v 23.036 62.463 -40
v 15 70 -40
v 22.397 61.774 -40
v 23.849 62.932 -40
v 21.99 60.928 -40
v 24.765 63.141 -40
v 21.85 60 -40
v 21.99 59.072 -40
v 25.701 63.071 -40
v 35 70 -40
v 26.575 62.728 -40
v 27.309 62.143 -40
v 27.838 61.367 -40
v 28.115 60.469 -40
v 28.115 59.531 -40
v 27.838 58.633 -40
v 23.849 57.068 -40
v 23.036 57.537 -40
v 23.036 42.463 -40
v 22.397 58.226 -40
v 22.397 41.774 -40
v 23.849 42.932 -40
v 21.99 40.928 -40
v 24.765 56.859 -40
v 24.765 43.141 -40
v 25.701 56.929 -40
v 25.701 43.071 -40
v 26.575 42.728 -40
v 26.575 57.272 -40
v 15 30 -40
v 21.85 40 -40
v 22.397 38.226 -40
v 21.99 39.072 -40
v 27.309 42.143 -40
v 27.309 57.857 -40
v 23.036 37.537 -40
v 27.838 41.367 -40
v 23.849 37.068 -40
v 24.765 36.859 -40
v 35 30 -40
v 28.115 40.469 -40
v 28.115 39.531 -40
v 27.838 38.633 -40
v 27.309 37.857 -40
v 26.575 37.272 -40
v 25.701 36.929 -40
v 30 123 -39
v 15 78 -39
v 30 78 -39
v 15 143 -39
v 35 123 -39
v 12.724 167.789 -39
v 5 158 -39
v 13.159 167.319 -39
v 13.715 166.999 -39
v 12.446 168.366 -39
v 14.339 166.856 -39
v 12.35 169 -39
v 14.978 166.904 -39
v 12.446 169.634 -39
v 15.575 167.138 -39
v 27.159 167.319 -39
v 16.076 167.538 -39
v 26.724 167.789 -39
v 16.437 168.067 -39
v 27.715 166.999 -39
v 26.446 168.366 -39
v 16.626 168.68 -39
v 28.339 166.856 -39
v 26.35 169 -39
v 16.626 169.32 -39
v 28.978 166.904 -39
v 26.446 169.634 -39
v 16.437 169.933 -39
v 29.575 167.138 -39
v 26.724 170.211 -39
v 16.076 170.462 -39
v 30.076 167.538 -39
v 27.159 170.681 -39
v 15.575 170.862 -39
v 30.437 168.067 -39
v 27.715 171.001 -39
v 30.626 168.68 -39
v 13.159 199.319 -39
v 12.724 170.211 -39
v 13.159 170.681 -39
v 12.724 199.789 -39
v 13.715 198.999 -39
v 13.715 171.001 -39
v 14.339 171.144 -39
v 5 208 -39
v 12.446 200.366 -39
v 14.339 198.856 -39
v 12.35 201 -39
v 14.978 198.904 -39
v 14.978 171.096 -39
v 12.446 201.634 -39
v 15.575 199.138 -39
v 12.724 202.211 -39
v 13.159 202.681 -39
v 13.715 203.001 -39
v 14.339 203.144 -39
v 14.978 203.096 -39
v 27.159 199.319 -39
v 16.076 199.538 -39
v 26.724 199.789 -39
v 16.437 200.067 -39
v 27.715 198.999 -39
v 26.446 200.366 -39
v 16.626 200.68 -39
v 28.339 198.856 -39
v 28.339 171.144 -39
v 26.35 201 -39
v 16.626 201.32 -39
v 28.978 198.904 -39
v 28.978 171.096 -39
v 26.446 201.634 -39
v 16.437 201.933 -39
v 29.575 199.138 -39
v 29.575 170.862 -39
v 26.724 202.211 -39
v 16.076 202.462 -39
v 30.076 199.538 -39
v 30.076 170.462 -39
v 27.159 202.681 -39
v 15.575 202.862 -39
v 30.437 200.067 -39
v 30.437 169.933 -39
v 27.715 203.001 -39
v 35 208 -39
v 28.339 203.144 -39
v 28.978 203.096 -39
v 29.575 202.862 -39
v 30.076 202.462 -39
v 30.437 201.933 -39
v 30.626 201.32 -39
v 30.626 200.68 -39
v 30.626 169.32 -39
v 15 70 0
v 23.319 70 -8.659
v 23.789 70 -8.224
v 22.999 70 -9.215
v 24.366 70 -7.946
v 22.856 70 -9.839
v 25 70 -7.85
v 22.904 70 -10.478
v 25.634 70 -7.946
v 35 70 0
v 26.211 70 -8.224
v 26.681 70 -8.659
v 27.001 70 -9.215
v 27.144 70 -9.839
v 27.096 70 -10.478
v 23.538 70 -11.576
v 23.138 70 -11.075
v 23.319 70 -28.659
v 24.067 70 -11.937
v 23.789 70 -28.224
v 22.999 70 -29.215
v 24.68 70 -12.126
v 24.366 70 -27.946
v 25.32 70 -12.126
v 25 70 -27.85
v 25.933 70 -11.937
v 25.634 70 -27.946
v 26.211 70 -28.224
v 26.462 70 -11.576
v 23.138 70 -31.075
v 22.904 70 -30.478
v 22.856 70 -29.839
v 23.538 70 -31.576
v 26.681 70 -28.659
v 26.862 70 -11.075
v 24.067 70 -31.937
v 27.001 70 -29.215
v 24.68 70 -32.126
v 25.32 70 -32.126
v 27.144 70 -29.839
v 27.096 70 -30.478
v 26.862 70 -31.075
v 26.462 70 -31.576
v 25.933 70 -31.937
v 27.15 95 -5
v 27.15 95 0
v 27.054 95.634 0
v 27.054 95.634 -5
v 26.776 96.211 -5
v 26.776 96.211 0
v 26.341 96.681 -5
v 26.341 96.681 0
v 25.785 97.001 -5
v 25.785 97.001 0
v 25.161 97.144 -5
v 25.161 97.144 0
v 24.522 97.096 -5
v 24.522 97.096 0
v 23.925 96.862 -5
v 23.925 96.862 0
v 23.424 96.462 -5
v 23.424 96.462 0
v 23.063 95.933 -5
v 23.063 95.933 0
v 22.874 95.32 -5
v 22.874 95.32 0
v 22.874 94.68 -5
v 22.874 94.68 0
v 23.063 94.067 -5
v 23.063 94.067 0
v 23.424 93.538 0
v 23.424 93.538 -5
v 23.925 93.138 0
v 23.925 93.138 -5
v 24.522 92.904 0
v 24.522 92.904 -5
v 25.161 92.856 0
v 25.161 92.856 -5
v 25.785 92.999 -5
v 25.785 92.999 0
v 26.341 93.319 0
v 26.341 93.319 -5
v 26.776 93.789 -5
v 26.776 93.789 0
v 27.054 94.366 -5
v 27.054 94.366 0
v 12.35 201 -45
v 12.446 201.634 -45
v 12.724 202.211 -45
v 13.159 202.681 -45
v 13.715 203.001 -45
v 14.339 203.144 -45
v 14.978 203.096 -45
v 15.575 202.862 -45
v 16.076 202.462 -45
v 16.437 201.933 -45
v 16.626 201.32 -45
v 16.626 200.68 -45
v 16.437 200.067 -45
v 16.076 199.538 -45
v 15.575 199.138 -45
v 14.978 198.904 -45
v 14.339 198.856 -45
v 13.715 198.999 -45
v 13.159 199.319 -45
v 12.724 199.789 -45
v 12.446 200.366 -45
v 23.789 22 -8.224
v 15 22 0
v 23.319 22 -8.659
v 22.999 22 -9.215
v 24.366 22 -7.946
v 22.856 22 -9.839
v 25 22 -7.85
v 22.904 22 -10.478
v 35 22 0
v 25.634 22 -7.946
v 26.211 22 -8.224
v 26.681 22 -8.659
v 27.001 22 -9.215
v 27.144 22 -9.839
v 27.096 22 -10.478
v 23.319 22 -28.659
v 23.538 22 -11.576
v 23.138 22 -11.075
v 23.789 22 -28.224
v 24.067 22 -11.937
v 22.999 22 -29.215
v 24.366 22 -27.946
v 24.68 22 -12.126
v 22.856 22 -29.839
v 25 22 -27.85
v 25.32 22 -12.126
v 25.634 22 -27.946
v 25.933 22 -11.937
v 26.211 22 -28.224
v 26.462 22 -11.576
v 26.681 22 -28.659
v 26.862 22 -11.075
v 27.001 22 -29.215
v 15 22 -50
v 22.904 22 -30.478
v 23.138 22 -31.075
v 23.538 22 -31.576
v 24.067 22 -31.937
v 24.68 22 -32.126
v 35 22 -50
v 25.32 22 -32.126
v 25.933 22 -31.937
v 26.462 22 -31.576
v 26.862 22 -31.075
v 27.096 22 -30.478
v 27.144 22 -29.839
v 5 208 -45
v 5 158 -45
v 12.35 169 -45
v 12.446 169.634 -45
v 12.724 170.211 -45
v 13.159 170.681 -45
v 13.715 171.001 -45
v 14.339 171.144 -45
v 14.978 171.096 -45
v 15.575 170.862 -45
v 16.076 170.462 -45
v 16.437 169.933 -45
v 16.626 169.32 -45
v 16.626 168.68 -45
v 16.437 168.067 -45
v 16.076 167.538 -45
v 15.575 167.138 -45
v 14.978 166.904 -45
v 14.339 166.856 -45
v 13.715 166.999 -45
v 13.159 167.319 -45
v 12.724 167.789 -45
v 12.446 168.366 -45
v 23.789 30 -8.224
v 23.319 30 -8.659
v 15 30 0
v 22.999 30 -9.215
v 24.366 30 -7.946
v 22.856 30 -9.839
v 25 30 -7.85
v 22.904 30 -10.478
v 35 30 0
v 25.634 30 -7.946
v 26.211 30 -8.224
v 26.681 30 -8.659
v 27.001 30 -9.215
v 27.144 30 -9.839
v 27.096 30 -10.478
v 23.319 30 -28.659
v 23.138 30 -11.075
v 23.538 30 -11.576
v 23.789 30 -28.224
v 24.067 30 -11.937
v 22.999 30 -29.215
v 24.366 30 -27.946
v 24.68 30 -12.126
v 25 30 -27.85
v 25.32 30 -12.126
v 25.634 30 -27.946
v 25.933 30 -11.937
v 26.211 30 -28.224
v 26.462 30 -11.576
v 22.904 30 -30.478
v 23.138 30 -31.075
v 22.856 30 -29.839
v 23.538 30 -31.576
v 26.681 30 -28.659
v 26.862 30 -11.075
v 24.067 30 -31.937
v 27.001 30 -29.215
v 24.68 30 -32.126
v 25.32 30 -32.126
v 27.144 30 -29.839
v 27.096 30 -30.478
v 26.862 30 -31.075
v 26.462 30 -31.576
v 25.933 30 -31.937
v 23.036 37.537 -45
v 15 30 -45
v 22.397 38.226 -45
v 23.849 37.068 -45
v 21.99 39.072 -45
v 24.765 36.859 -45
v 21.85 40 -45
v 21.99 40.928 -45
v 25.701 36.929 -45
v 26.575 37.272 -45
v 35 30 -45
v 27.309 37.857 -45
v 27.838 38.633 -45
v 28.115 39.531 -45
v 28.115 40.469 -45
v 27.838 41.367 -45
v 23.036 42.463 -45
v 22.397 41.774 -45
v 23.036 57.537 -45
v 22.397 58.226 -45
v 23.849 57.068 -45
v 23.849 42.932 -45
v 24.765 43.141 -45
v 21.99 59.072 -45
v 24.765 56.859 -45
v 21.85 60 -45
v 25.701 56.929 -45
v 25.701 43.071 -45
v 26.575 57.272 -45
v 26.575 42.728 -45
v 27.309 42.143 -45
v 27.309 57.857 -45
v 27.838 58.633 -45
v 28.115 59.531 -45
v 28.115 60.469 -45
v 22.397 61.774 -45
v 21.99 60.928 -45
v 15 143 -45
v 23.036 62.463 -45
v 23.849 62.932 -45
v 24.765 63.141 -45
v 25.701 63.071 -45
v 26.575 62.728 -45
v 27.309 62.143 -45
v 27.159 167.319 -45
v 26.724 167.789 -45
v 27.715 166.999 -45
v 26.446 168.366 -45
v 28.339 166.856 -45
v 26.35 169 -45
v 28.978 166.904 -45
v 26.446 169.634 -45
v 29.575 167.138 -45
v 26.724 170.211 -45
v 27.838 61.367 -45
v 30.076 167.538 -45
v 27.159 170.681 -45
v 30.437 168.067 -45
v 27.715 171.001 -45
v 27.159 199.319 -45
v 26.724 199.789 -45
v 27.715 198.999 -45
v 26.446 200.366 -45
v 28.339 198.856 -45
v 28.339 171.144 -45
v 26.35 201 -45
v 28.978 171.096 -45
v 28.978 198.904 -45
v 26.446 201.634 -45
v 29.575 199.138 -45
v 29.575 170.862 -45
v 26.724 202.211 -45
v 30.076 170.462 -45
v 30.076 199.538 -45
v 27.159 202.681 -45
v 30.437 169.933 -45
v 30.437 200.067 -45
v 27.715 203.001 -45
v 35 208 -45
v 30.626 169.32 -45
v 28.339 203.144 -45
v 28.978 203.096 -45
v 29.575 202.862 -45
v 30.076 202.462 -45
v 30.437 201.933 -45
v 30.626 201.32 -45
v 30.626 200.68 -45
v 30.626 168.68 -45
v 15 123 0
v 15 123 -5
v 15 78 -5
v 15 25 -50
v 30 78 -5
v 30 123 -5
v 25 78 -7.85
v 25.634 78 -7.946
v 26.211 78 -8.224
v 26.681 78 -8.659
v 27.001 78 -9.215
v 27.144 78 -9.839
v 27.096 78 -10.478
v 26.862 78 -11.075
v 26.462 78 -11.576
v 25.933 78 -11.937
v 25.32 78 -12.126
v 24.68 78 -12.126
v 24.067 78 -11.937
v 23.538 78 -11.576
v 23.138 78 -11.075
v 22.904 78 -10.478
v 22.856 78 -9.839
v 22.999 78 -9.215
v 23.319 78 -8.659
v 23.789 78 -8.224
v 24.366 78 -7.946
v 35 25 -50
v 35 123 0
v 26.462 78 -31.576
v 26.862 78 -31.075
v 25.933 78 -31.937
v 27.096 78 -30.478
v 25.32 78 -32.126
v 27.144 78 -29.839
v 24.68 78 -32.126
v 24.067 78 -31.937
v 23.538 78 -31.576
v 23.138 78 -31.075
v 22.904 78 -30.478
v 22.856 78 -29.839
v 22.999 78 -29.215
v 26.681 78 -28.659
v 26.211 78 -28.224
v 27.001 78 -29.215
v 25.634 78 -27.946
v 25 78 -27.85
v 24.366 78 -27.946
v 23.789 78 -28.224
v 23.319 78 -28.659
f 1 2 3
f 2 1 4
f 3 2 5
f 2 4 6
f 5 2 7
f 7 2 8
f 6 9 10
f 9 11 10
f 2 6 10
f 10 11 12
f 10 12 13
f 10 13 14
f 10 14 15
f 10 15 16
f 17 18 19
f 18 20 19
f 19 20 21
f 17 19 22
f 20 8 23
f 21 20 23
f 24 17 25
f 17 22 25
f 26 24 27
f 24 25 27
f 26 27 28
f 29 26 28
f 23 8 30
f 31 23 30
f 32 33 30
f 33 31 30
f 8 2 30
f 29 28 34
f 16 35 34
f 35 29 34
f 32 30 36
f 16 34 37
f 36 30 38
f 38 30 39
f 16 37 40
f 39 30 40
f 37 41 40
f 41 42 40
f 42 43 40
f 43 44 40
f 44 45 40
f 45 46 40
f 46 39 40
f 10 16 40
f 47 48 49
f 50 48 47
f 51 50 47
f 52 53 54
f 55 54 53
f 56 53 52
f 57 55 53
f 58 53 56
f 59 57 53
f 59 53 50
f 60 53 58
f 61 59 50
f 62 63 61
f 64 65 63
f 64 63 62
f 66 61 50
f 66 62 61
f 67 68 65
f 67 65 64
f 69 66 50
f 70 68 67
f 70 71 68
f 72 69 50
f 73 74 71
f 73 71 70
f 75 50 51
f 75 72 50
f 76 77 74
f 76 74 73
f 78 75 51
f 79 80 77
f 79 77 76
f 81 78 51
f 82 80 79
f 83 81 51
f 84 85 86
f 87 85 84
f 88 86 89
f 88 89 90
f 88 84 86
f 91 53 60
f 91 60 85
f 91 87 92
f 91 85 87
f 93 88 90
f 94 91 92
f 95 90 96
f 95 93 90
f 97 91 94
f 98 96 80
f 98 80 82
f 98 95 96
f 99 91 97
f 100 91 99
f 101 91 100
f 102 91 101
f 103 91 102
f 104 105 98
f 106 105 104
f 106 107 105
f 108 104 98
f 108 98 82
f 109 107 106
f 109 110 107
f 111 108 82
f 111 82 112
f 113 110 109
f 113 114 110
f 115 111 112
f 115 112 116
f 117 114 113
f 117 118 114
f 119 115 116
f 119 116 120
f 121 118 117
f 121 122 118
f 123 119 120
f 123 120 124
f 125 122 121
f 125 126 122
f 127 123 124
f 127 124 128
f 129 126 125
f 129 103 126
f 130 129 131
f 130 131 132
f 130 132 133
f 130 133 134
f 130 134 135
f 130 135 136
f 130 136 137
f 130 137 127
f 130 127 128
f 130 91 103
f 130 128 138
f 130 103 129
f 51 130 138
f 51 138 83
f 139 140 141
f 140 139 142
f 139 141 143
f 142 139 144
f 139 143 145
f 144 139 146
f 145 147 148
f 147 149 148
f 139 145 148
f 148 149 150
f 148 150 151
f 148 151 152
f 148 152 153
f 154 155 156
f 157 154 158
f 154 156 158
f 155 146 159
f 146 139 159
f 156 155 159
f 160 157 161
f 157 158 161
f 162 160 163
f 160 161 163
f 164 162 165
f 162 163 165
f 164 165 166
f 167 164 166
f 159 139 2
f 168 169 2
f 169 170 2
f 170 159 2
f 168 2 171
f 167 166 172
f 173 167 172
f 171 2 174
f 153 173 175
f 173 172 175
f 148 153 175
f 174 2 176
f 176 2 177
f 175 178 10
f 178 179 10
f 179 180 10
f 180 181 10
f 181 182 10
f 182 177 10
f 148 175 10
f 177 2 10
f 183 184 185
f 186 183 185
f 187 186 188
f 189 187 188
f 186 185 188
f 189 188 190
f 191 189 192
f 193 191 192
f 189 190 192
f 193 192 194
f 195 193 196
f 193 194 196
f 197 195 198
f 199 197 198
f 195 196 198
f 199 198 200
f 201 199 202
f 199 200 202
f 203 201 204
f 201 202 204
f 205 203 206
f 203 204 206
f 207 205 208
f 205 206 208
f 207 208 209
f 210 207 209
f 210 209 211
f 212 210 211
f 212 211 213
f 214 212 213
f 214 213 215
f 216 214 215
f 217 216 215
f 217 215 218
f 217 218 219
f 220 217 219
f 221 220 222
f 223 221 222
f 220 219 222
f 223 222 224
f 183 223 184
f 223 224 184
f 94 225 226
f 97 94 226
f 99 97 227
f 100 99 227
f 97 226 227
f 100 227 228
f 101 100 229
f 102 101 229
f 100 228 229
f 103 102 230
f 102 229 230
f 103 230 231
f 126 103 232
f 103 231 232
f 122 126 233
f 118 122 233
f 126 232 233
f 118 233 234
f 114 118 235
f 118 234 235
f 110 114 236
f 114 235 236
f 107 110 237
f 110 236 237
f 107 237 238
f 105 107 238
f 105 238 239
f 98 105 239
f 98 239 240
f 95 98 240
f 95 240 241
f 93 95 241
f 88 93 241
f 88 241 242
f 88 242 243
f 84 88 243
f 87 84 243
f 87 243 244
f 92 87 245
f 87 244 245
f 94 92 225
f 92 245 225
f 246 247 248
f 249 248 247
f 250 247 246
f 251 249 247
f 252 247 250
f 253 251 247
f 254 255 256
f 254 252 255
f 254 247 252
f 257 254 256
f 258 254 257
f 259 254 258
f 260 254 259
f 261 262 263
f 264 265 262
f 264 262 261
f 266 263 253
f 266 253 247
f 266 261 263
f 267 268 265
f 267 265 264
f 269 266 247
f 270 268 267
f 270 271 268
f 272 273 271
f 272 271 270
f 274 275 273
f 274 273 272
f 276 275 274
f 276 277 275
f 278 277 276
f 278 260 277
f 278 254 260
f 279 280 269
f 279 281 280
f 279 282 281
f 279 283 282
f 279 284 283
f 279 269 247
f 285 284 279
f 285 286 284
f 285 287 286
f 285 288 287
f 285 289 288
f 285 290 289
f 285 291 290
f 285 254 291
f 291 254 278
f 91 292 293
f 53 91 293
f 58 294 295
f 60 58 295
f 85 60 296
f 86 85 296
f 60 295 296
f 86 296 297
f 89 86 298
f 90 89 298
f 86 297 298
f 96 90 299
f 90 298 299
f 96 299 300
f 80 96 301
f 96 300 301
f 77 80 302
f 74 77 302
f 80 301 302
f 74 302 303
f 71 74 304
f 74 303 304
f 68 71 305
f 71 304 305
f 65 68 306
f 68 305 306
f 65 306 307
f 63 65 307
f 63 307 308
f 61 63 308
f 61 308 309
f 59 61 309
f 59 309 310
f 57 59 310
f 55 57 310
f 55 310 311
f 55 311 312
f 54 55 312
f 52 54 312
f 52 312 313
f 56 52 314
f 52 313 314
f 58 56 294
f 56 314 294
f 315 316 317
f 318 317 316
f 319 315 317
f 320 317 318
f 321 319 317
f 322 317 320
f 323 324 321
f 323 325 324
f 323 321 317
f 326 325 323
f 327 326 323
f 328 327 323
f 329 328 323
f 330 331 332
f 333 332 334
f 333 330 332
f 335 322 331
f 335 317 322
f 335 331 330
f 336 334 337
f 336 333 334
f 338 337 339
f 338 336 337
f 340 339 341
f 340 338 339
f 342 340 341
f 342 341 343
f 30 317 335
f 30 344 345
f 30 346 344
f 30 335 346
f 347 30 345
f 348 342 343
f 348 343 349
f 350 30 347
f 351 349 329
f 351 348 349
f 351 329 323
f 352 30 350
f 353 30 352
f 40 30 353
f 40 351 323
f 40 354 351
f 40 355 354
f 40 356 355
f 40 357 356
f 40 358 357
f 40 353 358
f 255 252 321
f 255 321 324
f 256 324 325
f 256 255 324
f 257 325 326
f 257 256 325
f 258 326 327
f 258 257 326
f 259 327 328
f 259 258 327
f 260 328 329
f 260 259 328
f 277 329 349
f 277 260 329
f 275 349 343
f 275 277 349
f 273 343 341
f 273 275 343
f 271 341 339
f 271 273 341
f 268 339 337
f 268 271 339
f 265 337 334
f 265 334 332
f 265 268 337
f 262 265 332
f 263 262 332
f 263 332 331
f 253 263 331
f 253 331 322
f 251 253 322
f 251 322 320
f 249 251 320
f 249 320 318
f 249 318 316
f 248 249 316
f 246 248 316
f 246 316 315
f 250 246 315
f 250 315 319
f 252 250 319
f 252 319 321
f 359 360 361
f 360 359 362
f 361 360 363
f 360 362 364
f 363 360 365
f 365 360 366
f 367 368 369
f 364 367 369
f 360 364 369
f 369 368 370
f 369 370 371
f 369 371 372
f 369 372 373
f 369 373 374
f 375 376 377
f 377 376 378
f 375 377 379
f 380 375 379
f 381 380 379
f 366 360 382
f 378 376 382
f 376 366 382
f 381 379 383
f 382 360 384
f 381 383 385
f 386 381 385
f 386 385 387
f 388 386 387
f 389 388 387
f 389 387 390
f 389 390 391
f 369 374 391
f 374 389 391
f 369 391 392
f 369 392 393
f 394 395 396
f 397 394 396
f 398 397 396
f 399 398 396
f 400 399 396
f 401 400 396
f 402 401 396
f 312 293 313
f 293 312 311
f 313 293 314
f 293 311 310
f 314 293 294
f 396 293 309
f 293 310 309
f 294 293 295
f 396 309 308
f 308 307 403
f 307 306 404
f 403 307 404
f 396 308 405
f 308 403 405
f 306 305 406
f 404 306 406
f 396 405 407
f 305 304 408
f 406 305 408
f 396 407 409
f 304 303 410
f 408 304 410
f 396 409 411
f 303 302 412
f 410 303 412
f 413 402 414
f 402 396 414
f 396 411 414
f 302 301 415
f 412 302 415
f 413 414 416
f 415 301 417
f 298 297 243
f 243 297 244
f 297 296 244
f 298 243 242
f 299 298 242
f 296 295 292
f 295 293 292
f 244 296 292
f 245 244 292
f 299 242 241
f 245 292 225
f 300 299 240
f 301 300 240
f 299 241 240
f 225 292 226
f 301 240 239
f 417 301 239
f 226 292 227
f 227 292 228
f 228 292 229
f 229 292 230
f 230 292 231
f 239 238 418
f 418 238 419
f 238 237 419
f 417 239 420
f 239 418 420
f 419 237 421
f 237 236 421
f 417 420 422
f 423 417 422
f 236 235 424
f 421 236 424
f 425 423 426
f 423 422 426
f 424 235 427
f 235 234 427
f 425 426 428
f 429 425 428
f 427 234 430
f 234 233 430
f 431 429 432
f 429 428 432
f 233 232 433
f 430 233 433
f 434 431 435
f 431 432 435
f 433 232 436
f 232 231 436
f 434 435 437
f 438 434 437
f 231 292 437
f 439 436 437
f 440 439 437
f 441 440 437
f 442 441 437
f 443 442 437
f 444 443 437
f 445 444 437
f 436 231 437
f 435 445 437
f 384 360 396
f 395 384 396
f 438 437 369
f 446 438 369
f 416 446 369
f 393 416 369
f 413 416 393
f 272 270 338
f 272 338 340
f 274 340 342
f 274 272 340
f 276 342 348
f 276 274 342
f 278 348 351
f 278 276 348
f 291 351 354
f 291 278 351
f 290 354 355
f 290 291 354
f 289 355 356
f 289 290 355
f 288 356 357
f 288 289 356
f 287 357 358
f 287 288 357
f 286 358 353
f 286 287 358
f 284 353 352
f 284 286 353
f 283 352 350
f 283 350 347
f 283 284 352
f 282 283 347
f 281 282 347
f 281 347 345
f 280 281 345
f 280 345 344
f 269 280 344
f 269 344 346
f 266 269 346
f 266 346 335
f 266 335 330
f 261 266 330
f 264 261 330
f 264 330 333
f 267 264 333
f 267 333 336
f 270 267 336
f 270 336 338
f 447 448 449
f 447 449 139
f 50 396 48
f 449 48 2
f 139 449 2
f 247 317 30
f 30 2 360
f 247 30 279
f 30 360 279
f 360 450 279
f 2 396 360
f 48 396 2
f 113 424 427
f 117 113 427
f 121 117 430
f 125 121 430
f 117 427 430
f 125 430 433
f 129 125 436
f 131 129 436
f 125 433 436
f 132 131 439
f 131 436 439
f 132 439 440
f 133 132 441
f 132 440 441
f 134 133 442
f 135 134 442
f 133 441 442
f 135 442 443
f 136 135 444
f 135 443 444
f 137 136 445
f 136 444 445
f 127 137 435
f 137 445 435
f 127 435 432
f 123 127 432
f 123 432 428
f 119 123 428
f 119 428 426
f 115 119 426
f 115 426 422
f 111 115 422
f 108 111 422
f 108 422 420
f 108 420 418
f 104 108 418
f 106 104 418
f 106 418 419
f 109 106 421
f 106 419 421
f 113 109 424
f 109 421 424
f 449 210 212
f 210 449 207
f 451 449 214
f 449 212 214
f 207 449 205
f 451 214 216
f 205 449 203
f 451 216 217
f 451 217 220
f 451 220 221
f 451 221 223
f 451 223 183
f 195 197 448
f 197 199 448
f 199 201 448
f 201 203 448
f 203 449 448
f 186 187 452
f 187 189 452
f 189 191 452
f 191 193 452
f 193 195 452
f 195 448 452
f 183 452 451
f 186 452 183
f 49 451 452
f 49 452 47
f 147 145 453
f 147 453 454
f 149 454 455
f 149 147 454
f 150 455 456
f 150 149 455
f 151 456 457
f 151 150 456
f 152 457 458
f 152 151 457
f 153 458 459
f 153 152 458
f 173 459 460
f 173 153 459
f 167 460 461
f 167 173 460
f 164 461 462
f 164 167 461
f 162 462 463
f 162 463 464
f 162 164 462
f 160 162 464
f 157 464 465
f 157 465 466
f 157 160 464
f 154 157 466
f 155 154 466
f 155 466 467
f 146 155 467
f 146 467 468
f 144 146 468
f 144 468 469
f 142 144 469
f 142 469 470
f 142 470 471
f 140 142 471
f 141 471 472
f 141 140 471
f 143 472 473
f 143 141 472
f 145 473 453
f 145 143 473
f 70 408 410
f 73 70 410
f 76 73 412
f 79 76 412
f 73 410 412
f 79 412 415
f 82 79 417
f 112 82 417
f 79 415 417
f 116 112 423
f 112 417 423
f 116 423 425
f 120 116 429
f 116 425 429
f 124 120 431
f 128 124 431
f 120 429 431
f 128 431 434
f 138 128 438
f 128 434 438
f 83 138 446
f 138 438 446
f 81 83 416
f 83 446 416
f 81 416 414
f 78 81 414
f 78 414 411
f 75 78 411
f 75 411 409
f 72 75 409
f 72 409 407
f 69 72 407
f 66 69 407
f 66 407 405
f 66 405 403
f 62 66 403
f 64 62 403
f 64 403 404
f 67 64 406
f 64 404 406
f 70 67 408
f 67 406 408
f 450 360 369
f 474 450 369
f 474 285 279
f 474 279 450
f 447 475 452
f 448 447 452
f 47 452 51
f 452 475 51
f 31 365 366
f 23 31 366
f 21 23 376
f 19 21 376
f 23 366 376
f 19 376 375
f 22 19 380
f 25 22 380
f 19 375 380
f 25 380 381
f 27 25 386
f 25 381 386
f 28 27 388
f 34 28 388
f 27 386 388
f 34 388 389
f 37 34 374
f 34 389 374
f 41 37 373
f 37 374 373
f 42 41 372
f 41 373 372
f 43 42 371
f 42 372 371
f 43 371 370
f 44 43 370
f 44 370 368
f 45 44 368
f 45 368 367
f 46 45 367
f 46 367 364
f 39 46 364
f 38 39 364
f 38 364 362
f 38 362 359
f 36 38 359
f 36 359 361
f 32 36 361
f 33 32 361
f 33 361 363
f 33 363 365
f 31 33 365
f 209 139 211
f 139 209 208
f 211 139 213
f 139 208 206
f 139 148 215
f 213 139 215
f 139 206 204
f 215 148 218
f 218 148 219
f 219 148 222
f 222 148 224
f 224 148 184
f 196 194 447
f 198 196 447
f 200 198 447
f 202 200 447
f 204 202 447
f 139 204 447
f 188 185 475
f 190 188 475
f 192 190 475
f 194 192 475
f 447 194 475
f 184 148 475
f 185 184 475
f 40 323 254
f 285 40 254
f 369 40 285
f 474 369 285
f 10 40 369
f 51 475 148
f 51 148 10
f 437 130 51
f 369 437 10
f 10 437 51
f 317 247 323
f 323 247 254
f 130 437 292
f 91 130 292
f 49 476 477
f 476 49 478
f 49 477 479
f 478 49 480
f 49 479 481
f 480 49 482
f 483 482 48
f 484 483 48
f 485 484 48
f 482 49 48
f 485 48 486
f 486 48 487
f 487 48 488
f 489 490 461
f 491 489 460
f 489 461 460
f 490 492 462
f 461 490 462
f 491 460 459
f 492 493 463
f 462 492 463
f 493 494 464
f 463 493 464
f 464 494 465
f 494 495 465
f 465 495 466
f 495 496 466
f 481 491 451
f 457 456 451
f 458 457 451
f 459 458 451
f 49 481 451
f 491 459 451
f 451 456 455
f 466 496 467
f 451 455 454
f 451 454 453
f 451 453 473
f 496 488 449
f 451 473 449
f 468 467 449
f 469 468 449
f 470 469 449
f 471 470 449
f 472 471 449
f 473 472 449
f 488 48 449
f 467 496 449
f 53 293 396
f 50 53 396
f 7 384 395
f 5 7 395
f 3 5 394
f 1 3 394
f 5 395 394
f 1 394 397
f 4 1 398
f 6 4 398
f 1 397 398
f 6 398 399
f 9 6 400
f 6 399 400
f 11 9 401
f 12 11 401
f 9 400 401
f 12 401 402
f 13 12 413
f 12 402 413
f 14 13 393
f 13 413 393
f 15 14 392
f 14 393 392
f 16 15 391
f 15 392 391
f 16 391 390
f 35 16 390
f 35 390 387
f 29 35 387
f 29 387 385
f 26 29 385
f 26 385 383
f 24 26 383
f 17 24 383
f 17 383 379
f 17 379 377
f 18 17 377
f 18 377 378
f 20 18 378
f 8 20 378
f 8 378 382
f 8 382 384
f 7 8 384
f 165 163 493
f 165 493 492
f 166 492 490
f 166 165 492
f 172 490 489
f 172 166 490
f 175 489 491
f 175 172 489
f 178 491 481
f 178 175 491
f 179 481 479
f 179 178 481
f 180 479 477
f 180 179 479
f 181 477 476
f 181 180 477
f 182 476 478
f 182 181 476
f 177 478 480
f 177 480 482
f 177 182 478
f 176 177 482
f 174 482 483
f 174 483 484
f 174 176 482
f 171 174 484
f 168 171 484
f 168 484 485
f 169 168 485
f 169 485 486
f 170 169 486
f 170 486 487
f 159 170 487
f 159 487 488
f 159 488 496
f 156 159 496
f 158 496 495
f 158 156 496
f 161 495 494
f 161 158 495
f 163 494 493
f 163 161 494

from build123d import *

# Parameters (mm, degrees)
SKETCH_1_W               = 35
SKETCH_1_H               = 80
SKETCH_1_R               = 2.15
EXTRUDE_1_DEPTH          = 30
SKETCH_3_W               = 35
SKETCH_3_H               = 5
EXTRUDE_2_DEPTH          = 40
SKETCH_4_W               = 40
SKETCH_4_H               = 22
SKETCH_4_W_2             = 30
SKETCH_4_H_2             = 20
CUT_EXTRUDE_2_DEPTH      = 70
CHAMFER_1_SIZE           = 5
SKETCH_7_R               = 3.15
CUT_EXTRUDE_3_DEPTH      = 70
CUT_EXTRUDE_4_DEPTH      = 70
SKETCH_9_R               = 2.15
EXTRUDE_3_DEPTH          = 8
EXTRUDE_4_DEPTH          = 35
CUT_EXTRUDE_5_DEPTH      = 154.300358773
CUT_EXTRUDE_5_DEPTH_BACK = 154.300358773
SKETCH_2_R               = 4.1
CUT_EXTRUDE_6_DEPTH      = 179.776396652
CUT_EXTRUDE_6_DEPTH_BACK = 179.776396652
SKETCH_11_W              = 15
SKETCH_11_H              = 156
SKETCH_13_W              = 40
SKETCH_13_H              = 22
CUT_EXTRUDE_7_DEPTH      = 177.453960001
SKETCH_19_W              = 45.998360267
SKETCH_19_H              = 78
CUT_EXTRUDE_11_DEPTH     = 56
SKETCH_21_R              = 2.15
EXTRUDE_8_DEPTH          = 6
SKETCH_22_W              = 39
SKETCH_22_H              = 45
EXTRUDE_9_DEPTH          = 5
SKETCH_23_W              = 20
SKETCH_23_H              = 53
SKETCH_23_R              = 2.15
EXTRUDE_10_DEPTH         = 5


with BuildPart() as part:
    # 草图1 → 凸台-拉伸1 (new body)
    with BuildSketch(Plane(origin=(0, 0, 0), x_dir=(1, 0, 0), z_dir=(0, 1, 0))):
        with Locations((17.5, 40)):
            Rectangle(SKETCH_1_W, SKETCH_1_H)
        with Locations(Location((25, 30, 0), (0, 0, 270))):
            Circle(SKETCH_1_R, mode=Mode.SUBTRACT)
        with Locations(Location((25, 10, 0), (0, 0, 270))):
            Circle(SKETCH_1_R, mode=Mode.SUBTRACT)
    extrude(amount=EXTRUDE_1_DEPTH)

    # 草图3 → 凸台-拉伸2 (add)
    with BuildSketch(Plane(origin=(0, 30, 0), x_dir=(1, 0, 0), z_dir=(0, 1, 0))):
        with Locations((17.5, 42.5)):
            Rectangle(SKETCH_3_W, SKETCH_3_H)
    extrude(amount=EXTRUDE_2_DEPTH)

    # 草图4 → 切除-拉伸2 (cut)
    with BuildSketch(Plane.ZY):
        with Locations((-20, 11)):
            Rectangle(SKETCH_4_W, SKETCH_4_H)
        with Locations((-65, 20)):
            Rectangle(SKETCH_4_W_2, SKETCH_4_H_2)
    extrude(amount=-CUT_EXTRUDE_2_DEPTH, mode=Mode.SUBTRACT)

    # 倒角1
    chamfer_1_edges = [part.edges().sort_by_distance(p)[0] for p in [
        (17.5, 30, -50),
    ]]
    chamfer(chamfer_1_edges, length=CHAMFER_1_SIZE - 0.0001)  # a hair under: the kernel refuses the full size

    # 草图7 → 切除-拉伸3 (cut)
    with BuildSketch(Plane(origin=(0, 0, -45), x_dir=(-1, 0, 0), z_dir=(0, 0, -1))):
        with Locations((-25, 60)):
            Circle(SKETCH_7_R)
        with Locations((-25, 40)):
            Circle(SKETCH_7_R)
    extrude(amount=-CUT_EXTRUDE_3_DEPTH, mode=Mode.SUBTRACT)

    # 草图8 → 切除-拉伸4 (cut)
    with BuildSketch(Plane(origin=(0, 30, 0), x_dir=(1, 0, 0), z_dir=(0, 1, 0))):
        Polygon((0, 0), (15, 0), (0, 36), align=None)
    extrude(amount=-CUT_EXTRUDE_4_DEPTH, mode=Mode.SUBTRACT)

    # 草图9 → 凸台-拉伸3 (add)
    with BuildSketch(Plane(origin=(0, 70, 0), x_dir=(1, 0, 0), z_dir=(0, 1, 0))):
        Polygon((35, 45), (0, 45), (0, 36), (15, 0), (35, 0), align=None)
        with Locations(Location((25, 30, 0), (0, 0, 270))):
            Circle(SKETCH_9_R, mode=Mode.SUBTRACT)
        with Locations(Location((25, 10, 0), (0, 0, 270))):
            Circle(SKETCH_9_R, mode=Mode.SUBTRACT)
    extrude(amount=EXTRUDE_3_DEPTH)

    # 草图10 → 凸台-拉伸4 (add, through all)
    with BuildSketch(Plane.ZY):
        Polygon((-40, 156), (-80, 156), (-80, 146), (-50, 146), (-50, 131), (-45, 126), (-45, 78), (-40.5, 78), align=None)
    extrude(amount=-EXTRUDE_4_DEPTH)

    # 草图2 → 切除-拉伸5 (cut, two sides: drawn at the far end of the back side and taken through both)
    with BuildSketch(Plane(origin=(0, 30, 0), x_dir=(1, 0, 0), z_dir=(0, 1, 0)).offset(-CUT_EXTRUDE_5_DEPTH_BACK)):
        with Locations(Location((10, 70, 0), (0, 0, 270))):
            Circle(SKETCH_2_R)
    extrude(amount=CUT_EXTRUDE_5_DEPTH + CUT_EXTRUDE_5_DEPTH_BACK, mode=Mode.SUBTRACT)

    # 草图11 → 切除-拉伸6 (cut, two sides: drawn at the far end of the back side and taken through both)
    with BuildSketch(Plane.XY.offset(-CUT_EXTRUDE_6_DEPTH_BACK)):
        with Locations((7.5, 78)):
            Rectangle(SKETCH_11_W, SKETCH_11_H)
    extrude(amount=CUT_EXTRUDE_6_DEPTH + CUT_EXTRUDE_6_DEPTH_BACK, mode=Mode.SUBTRACT)

    # 草图13 → 切除-拉伸7 (cut, through all)
    with BuildSketch(Plane(origin=(35, 0, 0), x_dir=(0, 0, -1), z_dir=(1, 0, 0))):
        with Locations((60, 11)):
            Rectangle(SKETCH_13_W, SKETCH_13_H)
    extrude(amount=-CUT_EXTRUDE_7_DEPTH, mode=Mode.SUBTRACT)

    # 草图19 → 切除-拉伸11 (cut)
    with BuildSketch(Plane.ZY.offset(-15)):
        with Locations((-57.000819867, 117)):
            Rectangle(SKETCH_19_W, SKETCH_19_H)
    extrude(amount=-CUT_EXTRUDE_11_DEPTH, mode=Mode.SUBTRACT)

    # 草图21 → 凸台-拉伸8 (add)
    with BuildSketch(Plane(origin=(0, 0, -45), x_dir=(-1, 0, 0), z_dir=(0, 0, -1))):
        Polygon((-35, 78), (-35, 208), (-5, 208), (-5, 158), (-15, 143), (-15, 78), align=None)
        with Locations((-28.5, 201)):
            Circle(SKETCH_21_R, mode=Mode.SUBTRACT)
        with Locations((-14.5, 201)):
            Circle(SKETCH_21_R, mode=Mode.SUBTRACT)
        with Locations((-28.5, 169)):
            Circle(SKETCH_21_R, mode=Mode.SUBTRACT)
        with Locations((-14.5, 169)):
            Circle(SKETCH_21_R, mode=Mode.SUBTRACT)
    extrude(amount=-EXTRUDE_8_DEPTH)

    # 草图22 → 凸台-拉伸9 (add)
    with BuildSketch(Plane(origin=(35, 0, 0), x_dir=(0, 0, -1), z_dir=(1, 0, 0))):
        with Locations((19.5, 100.5)):
            Rectangle(SKETCH_22_W, SKETCH_22_H)
    extrude(amount=-EXTRUDE_9_DEPTH)

    # 草图23 → 凸台-拉伸10 (add)
    with BuildSketch(Plane.XY):
        with Locations((25, 96.5)):
            Rectangle(SKETCH_23_W, SKETCH_23_H)
        with Locations((25, 95)):
            Circle(SKETCH_23_R, mode=Mode.SUBTRACT)
    extrude(amount=-EXTRUDE_10_DEPTH)


solid = part.part
